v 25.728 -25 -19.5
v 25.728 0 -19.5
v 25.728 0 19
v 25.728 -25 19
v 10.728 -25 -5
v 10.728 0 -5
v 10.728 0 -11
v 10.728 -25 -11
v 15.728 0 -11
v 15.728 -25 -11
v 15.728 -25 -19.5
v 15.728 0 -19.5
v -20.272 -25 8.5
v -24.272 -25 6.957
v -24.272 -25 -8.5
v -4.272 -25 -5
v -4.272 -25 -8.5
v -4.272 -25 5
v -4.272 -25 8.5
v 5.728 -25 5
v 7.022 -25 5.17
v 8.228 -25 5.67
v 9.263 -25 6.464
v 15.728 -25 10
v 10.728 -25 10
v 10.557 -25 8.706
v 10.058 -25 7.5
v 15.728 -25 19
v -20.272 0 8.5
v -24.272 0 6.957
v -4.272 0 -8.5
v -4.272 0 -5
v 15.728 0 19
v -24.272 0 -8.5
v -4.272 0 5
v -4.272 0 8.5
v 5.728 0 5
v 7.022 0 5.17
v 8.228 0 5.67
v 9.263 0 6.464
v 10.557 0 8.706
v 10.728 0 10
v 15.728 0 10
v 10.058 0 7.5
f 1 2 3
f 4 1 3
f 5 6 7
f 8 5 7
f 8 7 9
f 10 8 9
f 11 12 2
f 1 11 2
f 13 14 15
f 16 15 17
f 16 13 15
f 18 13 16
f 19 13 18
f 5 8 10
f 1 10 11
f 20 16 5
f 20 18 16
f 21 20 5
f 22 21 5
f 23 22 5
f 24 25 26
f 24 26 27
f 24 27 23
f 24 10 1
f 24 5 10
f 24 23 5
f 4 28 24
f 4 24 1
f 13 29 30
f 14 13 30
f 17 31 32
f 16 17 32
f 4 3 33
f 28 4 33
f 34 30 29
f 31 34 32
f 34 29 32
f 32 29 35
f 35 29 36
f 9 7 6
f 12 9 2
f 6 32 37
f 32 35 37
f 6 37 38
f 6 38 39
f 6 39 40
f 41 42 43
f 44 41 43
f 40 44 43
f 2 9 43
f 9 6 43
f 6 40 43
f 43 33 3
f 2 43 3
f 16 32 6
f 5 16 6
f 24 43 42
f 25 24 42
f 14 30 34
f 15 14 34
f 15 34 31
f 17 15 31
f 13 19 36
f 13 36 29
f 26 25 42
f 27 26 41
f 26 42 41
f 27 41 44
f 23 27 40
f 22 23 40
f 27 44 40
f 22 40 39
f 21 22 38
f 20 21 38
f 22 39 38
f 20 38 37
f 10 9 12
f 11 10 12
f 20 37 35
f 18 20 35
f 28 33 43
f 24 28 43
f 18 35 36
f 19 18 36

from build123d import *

# Parameters (mm, degrees)
F1_DEPTH = 25


with BuildPart() as f1:
    # F0 (on Front) → F1 (new body)
    with BuildSketch(Plane.XZ):
        with BuildLine():
            Line((-24.272264, 6.957319), (-24.272264, -8.5))
            Line((-24.272264, -8.5), (-4.272264, -8.5))
            Line((-4.272264, -8.5), (-4.272264, -5))
            Line((-4.272264, -5), (10.727736, -5))
            Line((10.727736, -5), (10.727736, -11))
            Line((10.727736, -11), (15.727736, -11))
            Line((15.727736, -11), (15.727736, -19.5))
            Line((15.727736, -19.5), (25.727736, -19.5))
            Line((25.727736, -19.5), (25.727736, 19))
            Line((25.727736, 19), (15.727736, 19))
            Line((15.727736, 19), (15.727736, 10))
            Line((15.727736, 10), (10.727736, 10))
            ThreePointArc((10.727736, 10), (9.263269, 6.464466), (5.727736, 5))
            Line((5.727736, 5), (-4.272264, 5))
            Line((-4.272264, 5), (-4.272264, 8.5))
            Line((-4.272264, 8.5), (-20.272264, 8.5))
            Line((-20.272264, 8.5), (-24.272264, 6.957319))
        make_face()
    extrude(amount=F1_DEPTH)


solid = f1.part
